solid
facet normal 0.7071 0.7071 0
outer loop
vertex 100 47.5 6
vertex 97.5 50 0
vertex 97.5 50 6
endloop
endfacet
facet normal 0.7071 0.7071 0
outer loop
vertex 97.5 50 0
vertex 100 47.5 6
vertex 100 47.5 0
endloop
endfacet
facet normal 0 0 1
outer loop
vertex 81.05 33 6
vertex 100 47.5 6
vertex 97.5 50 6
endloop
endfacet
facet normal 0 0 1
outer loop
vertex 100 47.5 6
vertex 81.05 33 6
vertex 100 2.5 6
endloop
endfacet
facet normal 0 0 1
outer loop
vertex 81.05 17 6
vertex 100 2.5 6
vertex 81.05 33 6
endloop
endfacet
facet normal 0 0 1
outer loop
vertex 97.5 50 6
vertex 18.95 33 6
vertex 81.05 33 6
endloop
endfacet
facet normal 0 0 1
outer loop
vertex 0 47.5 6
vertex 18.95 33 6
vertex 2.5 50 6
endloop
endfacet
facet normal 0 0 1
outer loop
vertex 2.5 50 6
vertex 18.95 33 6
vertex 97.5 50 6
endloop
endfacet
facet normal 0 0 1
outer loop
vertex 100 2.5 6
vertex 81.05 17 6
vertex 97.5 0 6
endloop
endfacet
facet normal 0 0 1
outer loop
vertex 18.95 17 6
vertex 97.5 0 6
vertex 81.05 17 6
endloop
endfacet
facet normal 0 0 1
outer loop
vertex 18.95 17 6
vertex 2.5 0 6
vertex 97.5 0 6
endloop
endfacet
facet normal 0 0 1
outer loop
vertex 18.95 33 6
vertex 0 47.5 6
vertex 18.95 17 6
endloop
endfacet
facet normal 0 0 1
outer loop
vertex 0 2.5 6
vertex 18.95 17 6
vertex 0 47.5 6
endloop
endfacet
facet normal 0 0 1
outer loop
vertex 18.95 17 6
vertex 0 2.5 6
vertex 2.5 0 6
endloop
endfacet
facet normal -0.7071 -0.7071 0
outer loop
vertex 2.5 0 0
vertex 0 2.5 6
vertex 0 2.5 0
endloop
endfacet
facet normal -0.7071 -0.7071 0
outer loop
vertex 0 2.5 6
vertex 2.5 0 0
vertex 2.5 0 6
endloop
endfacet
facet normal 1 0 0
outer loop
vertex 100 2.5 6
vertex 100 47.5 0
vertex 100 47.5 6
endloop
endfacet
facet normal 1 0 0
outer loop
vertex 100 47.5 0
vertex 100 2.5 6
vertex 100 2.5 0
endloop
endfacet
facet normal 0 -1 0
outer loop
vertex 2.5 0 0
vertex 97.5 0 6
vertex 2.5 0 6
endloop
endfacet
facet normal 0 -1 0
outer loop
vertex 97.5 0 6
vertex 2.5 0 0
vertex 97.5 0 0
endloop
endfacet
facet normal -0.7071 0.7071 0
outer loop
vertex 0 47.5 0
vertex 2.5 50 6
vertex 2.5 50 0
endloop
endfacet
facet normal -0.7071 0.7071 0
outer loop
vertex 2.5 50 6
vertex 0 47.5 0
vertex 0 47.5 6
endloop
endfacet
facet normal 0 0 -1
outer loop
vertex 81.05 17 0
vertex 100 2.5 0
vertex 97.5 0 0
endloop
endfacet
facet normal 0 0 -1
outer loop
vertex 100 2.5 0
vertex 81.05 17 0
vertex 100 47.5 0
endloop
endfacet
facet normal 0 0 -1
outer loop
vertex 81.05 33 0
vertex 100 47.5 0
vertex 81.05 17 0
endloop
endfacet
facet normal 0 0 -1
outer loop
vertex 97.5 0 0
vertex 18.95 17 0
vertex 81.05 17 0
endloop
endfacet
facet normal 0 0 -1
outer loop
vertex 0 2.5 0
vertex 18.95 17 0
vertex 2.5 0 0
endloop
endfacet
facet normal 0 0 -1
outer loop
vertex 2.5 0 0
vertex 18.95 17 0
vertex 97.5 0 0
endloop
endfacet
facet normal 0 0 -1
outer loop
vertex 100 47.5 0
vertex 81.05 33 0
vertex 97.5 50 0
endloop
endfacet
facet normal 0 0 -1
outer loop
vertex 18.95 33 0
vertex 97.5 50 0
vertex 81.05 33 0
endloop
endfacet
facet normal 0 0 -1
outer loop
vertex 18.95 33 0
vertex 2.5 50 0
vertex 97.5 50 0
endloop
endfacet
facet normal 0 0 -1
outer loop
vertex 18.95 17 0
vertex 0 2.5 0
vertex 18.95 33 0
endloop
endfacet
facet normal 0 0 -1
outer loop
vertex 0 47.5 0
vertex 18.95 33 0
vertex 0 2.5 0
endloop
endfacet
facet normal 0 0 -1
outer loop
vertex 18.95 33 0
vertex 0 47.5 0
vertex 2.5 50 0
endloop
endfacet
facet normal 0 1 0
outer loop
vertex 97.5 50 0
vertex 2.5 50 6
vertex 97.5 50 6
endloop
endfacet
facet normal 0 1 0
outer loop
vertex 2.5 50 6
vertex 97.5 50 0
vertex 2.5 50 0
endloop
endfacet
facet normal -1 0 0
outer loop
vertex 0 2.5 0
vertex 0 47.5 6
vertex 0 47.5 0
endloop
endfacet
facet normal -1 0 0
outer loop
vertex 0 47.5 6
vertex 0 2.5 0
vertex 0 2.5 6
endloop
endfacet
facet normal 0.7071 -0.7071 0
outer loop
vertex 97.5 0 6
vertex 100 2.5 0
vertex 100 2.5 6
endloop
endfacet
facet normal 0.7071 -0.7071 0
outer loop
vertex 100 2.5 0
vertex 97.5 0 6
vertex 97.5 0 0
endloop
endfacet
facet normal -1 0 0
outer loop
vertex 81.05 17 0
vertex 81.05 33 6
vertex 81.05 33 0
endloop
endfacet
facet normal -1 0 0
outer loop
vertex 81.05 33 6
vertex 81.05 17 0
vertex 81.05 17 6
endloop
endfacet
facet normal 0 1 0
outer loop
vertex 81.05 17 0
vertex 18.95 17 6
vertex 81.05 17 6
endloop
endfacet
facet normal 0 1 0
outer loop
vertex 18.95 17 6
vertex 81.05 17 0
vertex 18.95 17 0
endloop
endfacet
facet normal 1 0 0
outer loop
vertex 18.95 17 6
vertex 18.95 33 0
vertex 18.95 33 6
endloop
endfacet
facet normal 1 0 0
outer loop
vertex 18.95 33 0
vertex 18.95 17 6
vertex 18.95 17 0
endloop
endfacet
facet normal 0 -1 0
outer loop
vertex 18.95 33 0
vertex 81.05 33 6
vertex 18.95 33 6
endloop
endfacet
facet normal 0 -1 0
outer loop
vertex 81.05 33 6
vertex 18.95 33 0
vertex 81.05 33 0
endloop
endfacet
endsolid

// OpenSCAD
$fn = 32;

// ----------------------------------------------------------------------
// Windowed plate: 1 voids, 100 x 50 x 6 mm
// ----------------------------------------------------------------------

// --- parameters (mm) ---
plate_l = 100;            // plate length, X
plate_w = 50;             // plate width, Y
plate_t = 6;              // plate thickness, Z
edge_margin = 12;         // wall from the plate edge to any window
win1_l = 62.1;            // window length
win1_w = 16;              // window width
depth_1 = 6;              // depth of void 1 (full thickness = through)
corner_c = 2.5;           // corner chamfer of the plate

profile = [[2.5, 0], [97.5, 0], [100, 2.5], [100, 47.5], [97.5, 50], [2.5, 50], [0, 47.5], [0, 2.5]];  // primary outline, 8 points, counter clockwise
void_1 = [[18.95, 17], [81.05, 17], [81.05, 33], [18.95, 33]];  // large central window, 4 points

// --- the one profile operation ---
difference() {
  linear_extrude(height = plate_t) polygon(points = profile);
  translate([0, 0, -1])
    linear_extrude(height = plate_t + 2) polygon(points = void_1);
}
